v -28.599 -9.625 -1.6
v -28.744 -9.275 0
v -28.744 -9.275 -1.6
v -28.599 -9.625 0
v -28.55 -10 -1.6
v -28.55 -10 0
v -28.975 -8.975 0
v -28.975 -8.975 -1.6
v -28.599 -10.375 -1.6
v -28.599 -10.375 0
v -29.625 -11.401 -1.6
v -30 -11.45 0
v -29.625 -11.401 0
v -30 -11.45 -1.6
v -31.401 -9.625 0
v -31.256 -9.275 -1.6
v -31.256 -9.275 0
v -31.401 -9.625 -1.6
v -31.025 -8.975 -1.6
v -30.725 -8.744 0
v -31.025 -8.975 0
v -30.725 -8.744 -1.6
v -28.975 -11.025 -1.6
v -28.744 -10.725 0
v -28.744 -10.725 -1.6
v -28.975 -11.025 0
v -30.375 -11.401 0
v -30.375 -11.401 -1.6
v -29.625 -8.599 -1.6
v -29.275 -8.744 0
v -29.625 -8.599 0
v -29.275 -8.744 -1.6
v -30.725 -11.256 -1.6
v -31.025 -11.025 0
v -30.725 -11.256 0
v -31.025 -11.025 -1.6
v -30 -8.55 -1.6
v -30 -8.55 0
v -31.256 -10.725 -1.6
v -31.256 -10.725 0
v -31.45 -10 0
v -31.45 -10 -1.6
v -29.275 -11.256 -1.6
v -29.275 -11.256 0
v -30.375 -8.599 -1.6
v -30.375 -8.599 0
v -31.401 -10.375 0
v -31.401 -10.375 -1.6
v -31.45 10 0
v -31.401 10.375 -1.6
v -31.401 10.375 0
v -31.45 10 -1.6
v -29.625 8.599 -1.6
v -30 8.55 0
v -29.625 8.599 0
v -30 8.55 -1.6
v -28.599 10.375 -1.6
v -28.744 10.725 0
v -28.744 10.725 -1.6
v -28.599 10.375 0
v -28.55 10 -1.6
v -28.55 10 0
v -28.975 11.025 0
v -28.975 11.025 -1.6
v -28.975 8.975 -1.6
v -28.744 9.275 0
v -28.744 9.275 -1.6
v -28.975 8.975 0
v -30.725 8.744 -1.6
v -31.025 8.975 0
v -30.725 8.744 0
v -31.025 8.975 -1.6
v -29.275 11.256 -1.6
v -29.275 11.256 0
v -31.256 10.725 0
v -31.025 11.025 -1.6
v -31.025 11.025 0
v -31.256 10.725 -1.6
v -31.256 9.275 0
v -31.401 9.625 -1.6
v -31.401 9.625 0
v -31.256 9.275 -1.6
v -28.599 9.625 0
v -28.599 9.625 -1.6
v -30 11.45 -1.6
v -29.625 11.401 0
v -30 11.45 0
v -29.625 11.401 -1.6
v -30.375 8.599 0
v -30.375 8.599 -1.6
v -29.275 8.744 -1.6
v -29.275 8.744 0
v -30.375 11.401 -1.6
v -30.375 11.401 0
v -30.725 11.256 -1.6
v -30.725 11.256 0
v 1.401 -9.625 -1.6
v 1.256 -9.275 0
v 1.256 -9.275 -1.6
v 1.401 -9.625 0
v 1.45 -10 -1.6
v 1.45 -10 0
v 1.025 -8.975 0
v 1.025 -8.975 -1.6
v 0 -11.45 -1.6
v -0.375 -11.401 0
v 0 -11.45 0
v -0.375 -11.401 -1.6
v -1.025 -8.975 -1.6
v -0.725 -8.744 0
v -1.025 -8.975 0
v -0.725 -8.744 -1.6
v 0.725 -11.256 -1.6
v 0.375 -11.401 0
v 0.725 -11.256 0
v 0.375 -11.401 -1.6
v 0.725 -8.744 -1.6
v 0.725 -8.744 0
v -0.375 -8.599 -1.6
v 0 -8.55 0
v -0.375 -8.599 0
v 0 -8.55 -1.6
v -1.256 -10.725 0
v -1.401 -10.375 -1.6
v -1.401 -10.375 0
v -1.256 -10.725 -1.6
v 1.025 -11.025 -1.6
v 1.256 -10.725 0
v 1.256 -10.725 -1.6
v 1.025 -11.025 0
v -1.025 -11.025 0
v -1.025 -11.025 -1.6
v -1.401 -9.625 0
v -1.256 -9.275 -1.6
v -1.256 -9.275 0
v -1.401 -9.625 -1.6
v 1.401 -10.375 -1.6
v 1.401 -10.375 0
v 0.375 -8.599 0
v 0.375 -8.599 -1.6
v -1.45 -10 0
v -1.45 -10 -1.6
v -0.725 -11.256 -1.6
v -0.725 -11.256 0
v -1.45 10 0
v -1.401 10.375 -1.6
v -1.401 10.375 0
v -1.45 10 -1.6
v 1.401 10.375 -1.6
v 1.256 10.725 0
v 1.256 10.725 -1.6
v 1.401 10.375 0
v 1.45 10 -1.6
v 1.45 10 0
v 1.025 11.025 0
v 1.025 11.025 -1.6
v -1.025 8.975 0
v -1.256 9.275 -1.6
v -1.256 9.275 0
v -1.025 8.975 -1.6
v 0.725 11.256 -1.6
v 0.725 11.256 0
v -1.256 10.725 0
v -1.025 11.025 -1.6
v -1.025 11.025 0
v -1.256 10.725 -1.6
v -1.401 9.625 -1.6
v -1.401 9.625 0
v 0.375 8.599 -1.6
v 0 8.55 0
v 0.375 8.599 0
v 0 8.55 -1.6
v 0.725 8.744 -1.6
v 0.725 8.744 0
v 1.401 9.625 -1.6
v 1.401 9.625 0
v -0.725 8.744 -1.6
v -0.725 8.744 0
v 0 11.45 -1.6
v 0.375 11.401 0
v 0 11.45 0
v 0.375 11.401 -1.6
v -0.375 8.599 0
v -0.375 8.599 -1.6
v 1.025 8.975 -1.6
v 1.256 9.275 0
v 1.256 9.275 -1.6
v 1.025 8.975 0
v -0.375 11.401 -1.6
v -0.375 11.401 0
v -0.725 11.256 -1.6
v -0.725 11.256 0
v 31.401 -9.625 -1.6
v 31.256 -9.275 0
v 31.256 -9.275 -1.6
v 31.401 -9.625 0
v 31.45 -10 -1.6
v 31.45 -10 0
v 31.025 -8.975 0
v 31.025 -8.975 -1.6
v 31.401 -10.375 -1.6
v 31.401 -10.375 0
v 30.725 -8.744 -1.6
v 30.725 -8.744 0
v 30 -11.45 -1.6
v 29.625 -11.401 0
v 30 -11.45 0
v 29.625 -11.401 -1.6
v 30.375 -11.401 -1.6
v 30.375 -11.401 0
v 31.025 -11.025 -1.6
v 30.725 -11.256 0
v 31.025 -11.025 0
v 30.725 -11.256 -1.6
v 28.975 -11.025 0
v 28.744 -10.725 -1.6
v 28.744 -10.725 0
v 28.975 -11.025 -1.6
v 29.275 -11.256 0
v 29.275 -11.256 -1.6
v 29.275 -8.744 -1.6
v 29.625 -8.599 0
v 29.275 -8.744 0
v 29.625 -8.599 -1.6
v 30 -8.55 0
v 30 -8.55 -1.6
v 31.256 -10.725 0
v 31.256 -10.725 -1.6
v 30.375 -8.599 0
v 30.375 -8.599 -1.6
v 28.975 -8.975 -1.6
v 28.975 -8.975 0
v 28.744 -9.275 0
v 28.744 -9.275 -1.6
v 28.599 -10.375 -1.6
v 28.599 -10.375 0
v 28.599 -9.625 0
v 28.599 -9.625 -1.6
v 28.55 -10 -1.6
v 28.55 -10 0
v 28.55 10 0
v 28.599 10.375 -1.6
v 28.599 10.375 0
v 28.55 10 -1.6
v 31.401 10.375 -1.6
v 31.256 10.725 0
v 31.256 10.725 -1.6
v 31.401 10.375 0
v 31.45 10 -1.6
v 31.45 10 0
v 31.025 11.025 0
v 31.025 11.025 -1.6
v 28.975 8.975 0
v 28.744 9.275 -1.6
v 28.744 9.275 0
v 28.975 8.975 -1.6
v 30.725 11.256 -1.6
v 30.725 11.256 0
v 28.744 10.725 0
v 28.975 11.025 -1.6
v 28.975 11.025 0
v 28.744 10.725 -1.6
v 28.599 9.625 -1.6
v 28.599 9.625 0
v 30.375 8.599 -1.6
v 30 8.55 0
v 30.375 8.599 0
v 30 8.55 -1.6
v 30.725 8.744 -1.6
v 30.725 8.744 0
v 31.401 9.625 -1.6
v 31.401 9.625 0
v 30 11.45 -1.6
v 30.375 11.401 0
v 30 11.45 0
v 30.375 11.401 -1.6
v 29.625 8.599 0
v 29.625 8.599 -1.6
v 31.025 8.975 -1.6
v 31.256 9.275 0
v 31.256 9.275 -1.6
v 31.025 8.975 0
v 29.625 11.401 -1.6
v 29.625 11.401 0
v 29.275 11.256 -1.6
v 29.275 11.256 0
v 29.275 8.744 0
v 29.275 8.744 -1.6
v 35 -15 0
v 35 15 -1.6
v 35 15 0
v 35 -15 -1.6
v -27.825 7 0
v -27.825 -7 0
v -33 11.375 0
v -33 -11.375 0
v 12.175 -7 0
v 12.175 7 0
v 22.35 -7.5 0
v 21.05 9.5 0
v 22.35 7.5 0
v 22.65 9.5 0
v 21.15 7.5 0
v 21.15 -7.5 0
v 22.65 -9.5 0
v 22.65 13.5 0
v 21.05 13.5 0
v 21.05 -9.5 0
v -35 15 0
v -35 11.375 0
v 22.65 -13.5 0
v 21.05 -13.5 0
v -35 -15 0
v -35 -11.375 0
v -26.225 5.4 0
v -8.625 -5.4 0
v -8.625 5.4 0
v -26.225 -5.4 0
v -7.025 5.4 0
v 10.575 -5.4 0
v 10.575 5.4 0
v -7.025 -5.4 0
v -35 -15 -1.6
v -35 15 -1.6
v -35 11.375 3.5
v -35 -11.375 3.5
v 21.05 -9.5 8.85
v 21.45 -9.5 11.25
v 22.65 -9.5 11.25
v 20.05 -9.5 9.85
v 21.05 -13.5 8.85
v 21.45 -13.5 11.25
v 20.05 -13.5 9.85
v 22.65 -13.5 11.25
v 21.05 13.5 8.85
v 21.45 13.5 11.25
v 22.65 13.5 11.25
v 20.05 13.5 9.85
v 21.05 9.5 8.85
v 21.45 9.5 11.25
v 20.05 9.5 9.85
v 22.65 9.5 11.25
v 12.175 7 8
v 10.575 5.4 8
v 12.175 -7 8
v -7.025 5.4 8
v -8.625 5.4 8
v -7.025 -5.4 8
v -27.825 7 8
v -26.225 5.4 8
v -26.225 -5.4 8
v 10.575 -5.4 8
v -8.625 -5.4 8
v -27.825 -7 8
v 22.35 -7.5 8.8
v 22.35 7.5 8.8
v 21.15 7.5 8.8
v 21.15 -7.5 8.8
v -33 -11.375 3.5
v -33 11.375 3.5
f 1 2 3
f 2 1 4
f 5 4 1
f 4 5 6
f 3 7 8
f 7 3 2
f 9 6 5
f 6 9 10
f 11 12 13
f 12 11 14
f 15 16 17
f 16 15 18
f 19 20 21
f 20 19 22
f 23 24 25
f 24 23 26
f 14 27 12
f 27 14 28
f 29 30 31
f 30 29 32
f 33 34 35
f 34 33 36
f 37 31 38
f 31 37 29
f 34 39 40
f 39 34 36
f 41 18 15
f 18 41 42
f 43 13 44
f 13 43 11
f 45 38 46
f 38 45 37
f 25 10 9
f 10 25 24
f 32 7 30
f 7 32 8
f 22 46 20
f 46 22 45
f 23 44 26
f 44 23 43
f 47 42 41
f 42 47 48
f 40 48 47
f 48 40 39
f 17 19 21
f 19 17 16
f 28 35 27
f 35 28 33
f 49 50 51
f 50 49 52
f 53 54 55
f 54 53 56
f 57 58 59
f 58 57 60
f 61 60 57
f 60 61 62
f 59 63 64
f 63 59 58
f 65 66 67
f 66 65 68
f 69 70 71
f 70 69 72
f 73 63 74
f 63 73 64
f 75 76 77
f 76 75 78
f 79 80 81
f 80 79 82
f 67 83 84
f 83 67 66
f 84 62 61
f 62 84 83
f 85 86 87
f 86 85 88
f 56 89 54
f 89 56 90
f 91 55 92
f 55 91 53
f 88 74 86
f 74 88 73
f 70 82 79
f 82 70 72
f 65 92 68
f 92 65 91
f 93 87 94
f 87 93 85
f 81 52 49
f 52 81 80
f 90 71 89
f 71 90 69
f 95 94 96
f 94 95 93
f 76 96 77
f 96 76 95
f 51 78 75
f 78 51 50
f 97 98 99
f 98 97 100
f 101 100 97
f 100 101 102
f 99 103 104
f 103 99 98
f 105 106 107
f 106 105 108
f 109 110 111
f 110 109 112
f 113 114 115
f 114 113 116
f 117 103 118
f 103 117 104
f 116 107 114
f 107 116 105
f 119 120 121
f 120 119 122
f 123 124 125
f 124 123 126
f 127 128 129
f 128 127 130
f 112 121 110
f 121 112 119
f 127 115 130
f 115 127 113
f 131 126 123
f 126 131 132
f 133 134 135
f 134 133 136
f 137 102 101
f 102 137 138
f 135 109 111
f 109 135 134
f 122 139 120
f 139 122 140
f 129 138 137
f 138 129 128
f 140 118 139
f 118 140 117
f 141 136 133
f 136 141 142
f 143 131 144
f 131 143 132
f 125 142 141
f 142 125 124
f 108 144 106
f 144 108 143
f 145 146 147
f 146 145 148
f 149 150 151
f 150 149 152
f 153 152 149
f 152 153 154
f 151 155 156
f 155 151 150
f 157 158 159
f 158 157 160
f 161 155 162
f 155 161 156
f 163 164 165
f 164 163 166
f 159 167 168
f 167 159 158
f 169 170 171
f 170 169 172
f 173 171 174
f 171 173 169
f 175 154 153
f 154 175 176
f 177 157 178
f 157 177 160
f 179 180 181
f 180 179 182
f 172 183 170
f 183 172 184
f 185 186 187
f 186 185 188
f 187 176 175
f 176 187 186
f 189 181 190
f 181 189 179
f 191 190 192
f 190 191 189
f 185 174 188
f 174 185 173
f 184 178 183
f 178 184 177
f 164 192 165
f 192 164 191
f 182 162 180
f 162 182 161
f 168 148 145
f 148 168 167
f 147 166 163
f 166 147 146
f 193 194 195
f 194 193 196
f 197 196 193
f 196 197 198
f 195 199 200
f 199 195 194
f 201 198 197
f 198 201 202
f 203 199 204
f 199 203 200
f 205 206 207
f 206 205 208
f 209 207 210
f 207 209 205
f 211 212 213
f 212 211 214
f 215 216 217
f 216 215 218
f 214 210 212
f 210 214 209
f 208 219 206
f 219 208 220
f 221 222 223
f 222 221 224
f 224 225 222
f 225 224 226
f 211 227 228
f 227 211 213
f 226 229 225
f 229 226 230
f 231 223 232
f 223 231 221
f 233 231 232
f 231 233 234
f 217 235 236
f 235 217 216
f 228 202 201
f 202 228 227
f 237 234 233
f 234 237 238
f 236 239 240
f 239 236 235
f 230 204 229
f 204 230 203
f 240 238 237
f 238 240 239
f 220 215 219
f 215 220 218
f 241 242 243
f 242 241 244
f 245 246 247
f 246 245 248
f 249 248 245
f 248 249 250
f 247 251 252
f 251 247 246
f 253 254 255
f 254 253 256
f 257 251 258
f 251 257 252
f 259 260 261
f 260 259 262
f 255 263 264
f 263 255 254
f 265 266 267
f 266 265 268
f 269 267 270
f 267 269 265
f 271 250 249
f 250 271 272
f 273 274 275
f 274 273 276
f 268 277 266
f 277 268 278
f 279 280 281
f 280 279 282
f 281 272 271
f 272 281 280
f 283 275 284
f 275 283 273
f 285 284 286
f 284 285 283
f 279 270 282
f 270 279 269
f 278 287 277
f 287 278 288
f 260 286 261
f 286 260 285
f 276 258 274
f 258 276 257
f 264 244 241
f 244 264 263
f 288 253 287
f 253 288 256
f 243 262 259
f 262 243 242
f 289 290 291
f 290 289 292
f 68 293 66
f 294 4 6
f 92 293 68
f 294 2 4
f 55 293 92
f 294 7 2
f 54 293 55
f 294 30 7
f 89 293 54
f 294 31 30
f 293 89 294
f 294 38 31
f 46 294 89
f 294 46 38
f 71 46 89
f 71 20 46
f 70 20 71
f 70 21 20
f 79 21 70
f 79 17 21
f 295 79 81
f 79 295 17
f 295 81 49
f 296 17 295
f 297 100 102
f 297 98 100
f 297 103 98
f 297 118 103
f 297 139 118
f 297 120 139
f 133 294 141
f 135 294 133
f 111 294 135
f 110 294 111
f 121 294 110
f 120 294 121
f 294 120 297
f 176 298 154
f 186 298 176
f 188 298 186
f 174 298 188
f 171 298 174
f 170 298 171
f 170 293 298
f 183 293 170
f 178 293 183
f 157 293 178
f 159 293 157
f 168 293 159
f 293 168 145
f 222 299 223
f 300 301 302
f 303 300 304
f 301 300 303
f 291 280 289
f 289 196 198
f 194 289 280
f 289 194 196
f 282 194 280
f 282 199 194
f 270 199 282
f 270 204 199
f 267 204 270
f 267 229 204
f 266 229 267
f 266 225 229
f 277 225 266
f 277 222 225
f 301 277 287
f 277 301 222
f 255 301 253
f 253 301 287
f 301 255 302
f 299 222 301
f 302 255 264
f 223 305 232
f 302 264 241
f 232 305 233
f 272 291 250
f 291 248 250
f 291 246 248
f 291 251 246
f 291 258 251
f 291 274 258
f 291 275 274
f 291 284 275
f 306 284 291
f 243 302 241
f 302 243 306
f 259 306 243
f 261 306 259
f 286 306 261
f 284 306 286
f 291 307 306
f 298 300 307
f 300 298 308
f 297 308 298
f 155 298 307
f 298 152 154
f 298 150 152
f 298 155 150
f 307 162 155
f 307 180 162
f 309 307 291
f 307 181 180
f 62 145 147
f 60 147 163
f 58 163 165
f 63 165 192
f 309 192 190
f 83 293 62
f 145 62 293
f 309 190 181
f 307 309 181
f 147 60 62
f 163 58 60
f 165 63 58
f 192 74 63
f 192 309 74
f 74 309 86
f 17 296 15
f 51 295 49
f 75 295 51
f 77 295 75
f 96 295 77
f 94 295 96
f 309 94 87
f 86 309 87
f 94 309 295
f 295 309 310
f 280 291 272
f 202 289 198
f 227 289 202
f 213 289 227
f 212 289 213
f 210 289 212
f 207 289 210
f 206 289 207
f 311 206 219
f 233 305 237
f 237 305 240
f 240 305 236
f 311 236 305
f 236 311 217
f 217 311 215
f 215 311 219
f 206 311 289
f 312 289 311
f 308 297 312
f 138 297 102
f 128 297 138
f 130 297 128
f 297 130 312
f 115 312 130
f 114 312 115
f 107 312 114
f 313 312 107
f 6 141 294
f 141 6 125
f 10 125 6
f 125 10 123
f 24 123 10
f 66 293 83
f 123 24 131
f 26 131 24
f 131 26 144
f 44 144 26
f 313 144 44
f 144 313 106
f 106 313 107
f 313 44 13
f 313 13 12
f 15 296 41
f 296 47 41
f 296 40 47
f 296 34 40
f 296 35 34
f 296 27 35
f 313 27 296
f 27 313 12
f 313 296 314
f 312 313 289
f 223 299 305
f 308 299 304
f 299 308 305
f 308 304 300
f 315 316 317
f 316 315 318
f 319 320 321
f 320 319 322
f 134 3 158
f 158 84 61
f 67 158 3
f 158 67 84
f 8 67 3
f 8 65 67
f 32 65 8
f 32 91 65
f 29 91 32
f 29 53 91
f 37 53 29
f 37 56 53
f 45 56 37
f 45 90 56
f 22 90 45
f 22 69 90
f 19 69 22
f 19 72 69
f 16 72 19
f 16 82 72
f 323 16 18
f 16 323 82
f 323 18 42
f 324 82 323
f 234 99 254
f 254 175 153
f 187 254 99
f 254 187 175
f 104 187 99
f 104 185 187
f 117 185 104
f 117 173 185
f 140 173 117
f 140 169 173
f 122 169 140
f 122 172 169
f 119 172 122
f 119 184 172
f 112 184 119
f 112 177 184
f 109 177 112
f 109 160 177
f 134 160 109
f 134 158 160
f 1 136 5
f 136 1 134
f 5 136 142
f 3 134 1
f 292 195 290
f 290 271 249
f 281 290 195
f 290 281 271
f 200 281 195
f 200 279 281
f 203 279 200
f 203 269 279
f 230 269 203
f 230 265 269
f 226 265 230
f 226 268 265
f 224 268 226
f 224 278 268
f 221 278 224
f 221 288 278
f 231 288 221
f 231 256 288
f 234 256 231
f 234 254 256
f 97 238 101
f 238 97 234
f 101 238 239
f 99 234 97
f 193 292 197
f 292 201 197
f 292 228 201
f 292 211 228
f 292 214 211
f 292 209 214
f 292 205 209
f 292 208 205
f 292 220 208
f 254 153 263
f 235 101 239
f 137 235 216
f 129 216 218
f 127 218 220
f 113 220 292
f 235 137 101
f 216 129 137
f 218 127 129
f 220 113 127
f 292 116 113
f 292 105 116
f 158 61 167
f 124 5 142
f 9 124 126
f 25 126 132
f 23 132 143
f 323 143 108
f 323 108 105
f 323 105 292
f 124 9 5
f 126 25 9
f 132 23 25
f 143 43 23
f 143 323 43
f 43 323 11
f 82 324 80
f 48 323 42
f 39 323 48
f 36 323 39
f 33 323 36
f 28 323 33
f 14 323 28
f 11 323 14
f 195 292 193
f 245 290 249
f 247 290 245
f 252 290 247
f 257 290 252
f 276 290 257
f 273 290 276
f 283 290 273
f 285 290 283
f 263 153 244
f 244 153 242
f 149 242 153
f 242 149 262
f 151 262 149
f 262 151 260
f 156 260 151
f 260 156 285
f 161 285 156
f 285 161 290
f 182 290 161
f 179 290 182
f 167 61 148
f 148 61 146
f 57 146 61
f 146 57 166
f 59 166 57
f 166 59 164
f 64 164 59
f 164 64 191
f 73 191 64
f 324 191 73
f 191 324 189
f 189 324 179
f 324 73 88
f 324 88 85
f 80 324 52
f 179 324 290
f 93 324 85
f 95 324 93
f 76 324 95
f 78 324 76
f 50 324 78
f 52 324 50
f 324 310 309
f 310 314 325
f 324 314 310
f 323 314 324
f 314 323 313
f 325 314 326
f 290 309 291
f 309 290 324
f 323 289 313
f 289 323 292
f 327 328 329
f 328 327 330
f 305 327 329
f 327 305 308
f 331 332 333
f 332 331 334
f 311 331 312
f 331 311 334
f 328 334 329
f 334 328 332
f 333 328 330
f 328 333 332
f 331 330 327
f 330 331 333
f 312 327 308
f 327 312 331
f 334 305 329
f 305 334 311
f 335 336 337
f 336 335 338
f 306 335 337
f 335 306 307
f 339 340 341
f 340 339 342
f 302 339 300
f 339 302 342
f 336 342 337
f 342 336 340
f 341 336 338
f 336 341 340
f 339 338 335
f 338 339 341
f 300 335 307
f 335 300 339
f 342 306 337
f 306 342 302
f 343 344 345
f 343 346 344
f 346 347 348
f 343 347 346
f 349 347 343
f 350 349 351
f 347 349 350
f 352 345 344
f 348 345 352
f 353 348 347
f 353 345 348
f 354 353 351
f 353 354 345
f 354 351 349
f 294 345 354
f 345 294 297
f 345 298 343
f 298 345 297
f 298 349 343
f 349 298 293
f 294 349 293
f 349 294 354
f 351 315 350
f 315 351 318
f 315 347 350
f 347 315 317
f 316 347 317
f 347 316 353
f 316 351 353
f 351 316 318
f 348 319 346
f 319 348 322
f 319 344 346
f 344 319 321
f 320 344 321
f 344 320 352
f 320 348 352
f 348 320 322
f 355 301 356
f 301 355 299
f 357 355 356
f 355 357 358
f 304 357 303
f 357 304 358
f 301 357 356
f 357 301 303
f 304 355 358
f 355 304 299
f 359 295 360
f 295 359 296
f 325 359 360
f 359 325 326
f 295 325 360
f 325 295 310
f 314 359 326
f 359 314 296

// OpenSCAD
// file: ../../screw-post/screw-post.scad
//-----------------------------------------------------------------------
// Screw post: a round post off the floor that a board screws down onto
//
// Two ways to fix:
//   "nut"  clearance hole through the post and floor; the nut sits in a hex
//          trap in the floor's underside, so the screw goes in from the top
//   "tap"  a pilot hole the screw cuts its own thread in (one or two fittings
//          in PLA/PETG); blind, the floor stays whole underneath
// and "head" for a screw up from below (head in a counterbore, nut on top).
//
// Modules, all in the same frame:
//   screwPostGhost()     the screw (and nut), for previews
//   screwPost()          the post: add to the floor
//   screwPostFloorCut()  subtract from the floor: nut trap / counterbore and hole
//
// Frame: origin on the floor top, on the post's axis. Z up; the floor is
// Z = -floorThick .. 0. Units: mm.
//
// Sizes: "M2", "M2.5", "M3". screwPostScrew(size, ...) says which screw length
// reaches, so a project can assert it has that screw in the kit.
//-----------------------------------------------------------------------

//-- [name, screw Ø, nut across flats, nut thick, head Ø, head height, tap hole, post Ø]
//-- Nuts ISO 4032; heads ISO 7380 button. Tap holes: the usual ~0.8 x Ø for plastic
screwSizes = [
  ["M2",   2.0, 4.0, 1.6, 3.5, 1.1, 1.6, 5.0],
  ["M2.5", 2.5, 5.0, 2.0, 4.4, 1.4, 2.1, 6.0],    // head 4.4: measured on the kit's M2.5 (controller base)
  ["M3",   3.0, 5.5, 2.4, 5.7, 1.65, 2.5, 7.0],
];

screwHoleClear = 0.4;     // added to the screw Ø for a clearance hole
screwNutClear  = 0.3;     // CAL: across flats, nut trap over the nut. Set by the fit piece
screwTapClear  = 0.0;     // CAL: added to the tap hole. Set by the fit piece
screwHeadClear = 0.6;     // counterbore over the head Ø

function screwSize(size) = let (i = search([size], screwSizes)[0])
  assert(i != [] && i != undef, str("unknown screw size ", size)) screwSizes[i];
function screwDia(size)    = screwSize(size)[1];
function screwNutAF(size)  = screwSize(size)[2];
function screwNutH(size)   = screwSize(size)[3];
function screwHeadDia(size)= screwSize(size)[4];
function screwHeadH(size)  = screwSize(size)[5];
function screwPostDia(size)= screwSize(size)[7];

//-- Shortest screw that fills the nut, from the top of the clamped part (h + clamp
//-- above the floor) down to the nut trap's underside. Round up to a length you have.
function screwPostScrew(size, h, floorThick, clamp = 1.6) = h + clamp + floorThick;

module screwPostGhost(size, h, floorThick, clamp = 1.6, length, how = "nut")
{
  d = screwDia(size);
  L = is_undef(length) ? screwPostScrew(size, h, floorThick, clamp) : length;
  top = h + clamp;
  if (how == "head")
  {
    %color("Silver") translate([0, 0, -floorThick]) cylinder(d = screwHeadDia(size), h = screwHeadH(size), $fn = 24);
    %color("Silver") translate([0, 0, -floorThick + screwHeadH(size)]) cylinder(d = d, h = L, $fn = 16);
  }
  else
  {
    %color("Silver") translate([0, 0, top]) cylinder(d = screwHeadDia(size), h = screwHeadH(size), $fn = 24);
    %color("Silver") translate([0, 0, top - L]) cylinder(d = d, h = L, $fn = 16);
    if (how == "nut")
      %color("DimGray") translate([0, 0, -floorThick]) rotate([0, 0, 30]) cylinder(d = screwNutAF(size)/cos(30), h = screwNutH(size), $fn = 6);
  }
}

//-- how: "nut" | "head" (through hole) or "tap" (blind pilot hole). postDia defaults by size
module screwPost(size, h, how = "nut", postDia, tapClear = screwTapClear)
{
  pd = is_undef(postDia) ? screwPostDia(size) : postDia;
  hole = how == "tap" ? screwSize(size)[6] + tapClear : screwDia(size) + screwHoleClear;
  difference()
  {
    translate([0, 0, -0.01]) cylinder(d = pd, h = h + 0.01, $fn = 40);
    translate([0, 0, how == "tap" ? 0.6 : -1]) cylinder(d = hole, h = h + 2, $fn = 24);
    //-- lead-in so the screw starts square
    translate([0, 0, h - 0.4]) cylinder(d1 = hole, d2 = hole + 0.8, h = 0.41, $fn = 24);
  }
}

//-- "nut": hex trap from the underside, opening a little over the nut so it sits flush.
//-- "head": counterbore for the head. "tap": nothing.
module screwPostFloorCut(size, floorThick, how = "nut", nutClear = screwNutClear)
{
  d = screwDia(size) + screwHoleClear;
  if (how == "nut")
  {
    af = screwNutAF(size) + nutClear;
    translate([0, 0, -floorThick - 1]) rotate([0, 0, 30]) cylinder(d = af/cos(30), h = screwNutH(size) + 0.1 + 1, $fn = 6);
    translate([0, 0, -floorThick - 1]) cylinder(d = d + 0.4, h = floorThick + 2, $fn = 24);
  }
  if (how == "head")
  {
    translate([0, 0, -floorThick - 1]) cylinder(d = screwHeadDia(size) + screwHeadClear, h = screwHeadH(size) + 0.2 + 1, $fn = 32);
    translate([0, 0, -floorThick - 1]) cylinder(d = d + 0.4, h = floorThick + 2, $fn = 24);
  }
  assert(how == "tap" || floorThick >= (how == "nut" ? screwNutH(size) : screwHeadH(size)) + 0.1 + 0.3,
         str("floor too thin for the ", size, " ", how));
}
// file: ../../usb-c-port/usb-c-port.scad
//-----------------------------------------------------------------------
// USB-C port through a wall, flush: the socket's metal shell sits in a
// close-fitting pocket in the wall, walled in on all four sides, its face
// level with the outside. The cable seats the way it does on a laptop.
//
// A board's socket only overhangs the board edge by a mm or so, less than
// the wall. So the board's end tucks into a shallow relief in the wall's
// inner face, the width of the board, leaving the wall round the socket
// thin enough for the face to reach the outside. When that would leave less
// than usbcMinWall (a socket that barely overhangs), the face sits back from
// the outside instead: usbcRecess() says how far.
//
// Modules, all in the same frame:
//   usbcGhost()     the socket and the board's end, for previews
//   usbcWallCut()   subtract from the wall: socket pocket and board relief
//
// Frame: origin on the floor top at the wall's inner face, under the socket's
// axis. +X into the box, Z up. The wall is X = -wall .. 0. The board is
// component side up, socket on top (top-mount, as on the FireBeetle, C3 Super
// Mini and S3 DevKitC). Units: mm.
//
// usbcBoardEdgeX() gives where the board's edge lands (negative: inside the
// wall), so a holder can put its posts or pocket to match.
//-----------------------------------------------------------------------

//-- The socket: USB-C receptacle shell (USB-IF 8.34 x 2.56 plug, receptacle shell ~8.94 x 3.26)
usbcShellW     = 8.94;
usbcShellH     = 3.26;    // CAL per board: measured 3.2 on the FireBeetle
usbcShellR     = 1.2;     // CAL: end radius. Full round would be 1.63; most shells are squarer
usbcShellDepth = 7.35;    // face to back

//-- The pocket
usbcClearance  = 0.15;    // CAL: per side, shell to pocket. Set by the fit piece
usbcMinWall    = 1.0;     // thinnest wall left round the socket
usbcReliefGap  = 0.3;     // board relief over the board, each side and above/below
usbcChamfer    = 0.3;     // lead-in on the outside edge

//-- How far the socket face sits back from the outside: 0 (flush) unless the socket
//-- overhangs the board edge by less than usbcMinWall
function usbcRecess(overhang, minWall = usbcMinWall) = max(0, minWall - overhang);
//-- X of the board's socket edge in this frame
function usbcBoardEdgeX(wall, overhang, recess) =
  -wall + (is_undef(recess) ? usbcRecess(overhang) : recess) + overhang;
//-- Z of the board's underside above the floor top
function usbcBoardZ(axisZ, pcb, shellH = usbcShellH) = axisZ - shellH/2 - pcb;

module usbcShell2D(grow = 0, w = usbcShellW, h = usbcShellH, r = usbcShellR)
{
  offset(r = r + grow, $fn = 24) square([w - 2*r, h - 2*r], center = true);
}

//-- axisZ: socket axis above the floor. boardW/pcb: the board, for the ghost and relief.
//-- shift: socket centre across the board's width from the board's centre line (+Y)
module usbcGhost(axisZ, wall, overhang, boardW, pcb = 1.6, recess, shift = 0, shellH = usbcShellH, shellW = usbcShellW)
{
  ex = usbcBoardEdgeX(wall, overhang, recess);
  %color("Silver") translate([ex - overhang, 0, axisZ]) rotate([0, 90, 0]) rotate([0, 0, 90])
    linear_extrude(usbcShellDepth) usbcShell2D(w = shellW, h = shellH);
  %color("DarkSlateGray") translate([ex, -boardW/2 - shift, usbcBoardZ(axisZ, pcb, shellH)]) cube([12, boardW, pcb]);
}

module usbcWallCut(axisZ, wall, overhang, boardW, pcb = 1.6, recess, shift = 0,
                   clearance = usbcClearance, shellH = usbcShellH, shellW = usbcShellW, aboveBoard)
{
  rc = is_undef(recess) ? usbcRecess(overhang) : recess;
  ex = usbcBoardEdgeX(wall, overhang, rc);
  bz = usbcBoardZ(axisZ, pcb, shellH);
  //-- what stands on the board near its edge: the socket, unless told taller
  up = is_undef(aboveBoard) ? shellH : aboveBoard;
  assert(ex - overhang + wall >= -0.01, "socket face would stand proud of the wall");
  assert(rc > 0 || overhang >= usbcMinWall - 0.01, "wall round the socket under usbcMinWall");
  //-- socket pocket, through the wall
  translate([-wall - 1, 0, axisZ]) rotate([0, 90, 0]) rotate([0, 0, 90])
    linear_extrude(wall + 2) usbcShell2D(clearance, w = shellW, h = shellH);
  //-- lead-in chamfer on the outside
  translate([-wall, 0, axisZ]) rotate([0, 90, 0]) rotate([0, 0, 90])
    hull()
    {
      translate([0, 0, -0.01]) linear_extrude(0.01) usbcShell2D(clearance + usbcChamfer, w = shellW, h = shellH);
      translate([0, 0, usbcChamfer]) linear_extrude(0.01) usbcShell2D(clearance, w = shellW, h = shellH);
    }
  //-- board relief in the inner face, when the board's edge lands inside the wall
  if (ex < 0)
    translate([ex - usbcReliefGap, -boardW/2 - shift - usbcReliefGap, bz - usbcReliefGap])
      cube([-ex + usbcReliefGap + 1, boardW + 2*usbcReliefGap, pcb + up + 2*usbcReliefGap]);
}
// file: ../../board-pocket/board-pocket.scad
//-----------------------------------------------------------------------
// Board pocket: holds a board that has no mounting holes
//
// The board sits on a central pedestal with a pad of double-sided foam tape
// on top, inside a low wall that follows its outline. The pedestal keeps
// the board's edges off the floor, so lead stubs soldered through the edge
// holes have room underneath; gaps in the wall let the leads out. The wall
// only locates the board: the tape holds it down, and in a closed box a lid
// pad presses a pad of foam onto it (boardLidPad below).
//
// Modules, all in the same frame:
//   boardPocketGhost()   the board and its tape, for previews
//   boardPocketHolder()  the plastic: pedestal and outline wall, add to the floor
//   boardLidPad()        a block hanging from the lid that presses foam onto the board
//   boardLidPadGhost()   the foam under it, squashed, for previews
//
// Frame: origin on the floor top, under the centre of the board's outline.
// X along the board's length l, Y across its width w, Z up. Units: mm.
//
// Sides are listed [-X, +X, -Y, +Y], each one of
//   "gap"    wall with a gap in the middle for leads (gapW wide)
//   "solid"  whole wall: use it where the board takes a push (a plug)
//   "open"   no wall: the board's edge goes into a box wall (a USB port)
//
// Used by esp32-c3-supermini, esp32-s3-devkitc and rs485-max485.
//-----------------------------------------------------------------------

//-- From the controller project's receiver.scad / rack-end.scad (boardPocket), 2026-10-30
bpPedestal  = 2.5;     // floor to the tape: room for lead stubs under the board edges
bpTape      = 1.0;     // double-sided foam tape on the pedestal. CAL: how far it squashes
bpWall      = 1.2;     // outline wall thickness
bpRise      = 1.0;     // wall top above the PCB underside (the controller project's rack-end: 0.8 under the S3's module)
bpClearance = 0.4;     // per side, board outline to wall: PETG. 0.3 for PLA. Set by the fit piece
bpGapW      = 6;       // lead gap in a "gap" side
bpPadInset  = 4;       // default pedestal: the board less this all round

//-- Lid hold-down (the controller project's receiver / rack-end lid pads)
bpFoam      = 3.0;     // CAL: self-adhesive foam stuck under each lid pad
bpSqueeze   = 1.0;     // how far the lid squashes it: ~1/3 for soft foam, 0.3 for felt

//-- PCB underside above the floor top
function boardPocketZ(pedestal = bpPedestal, tape = bpTape) = pedestal + tape;
//-- default pedestal [l, w] for a board
function boardPocketPad(l, w, inset = bpPadInset) = [max(l - 2*inset, 4), max(w - 2*inset, 4)];
//-- Z of a lid pad's underside, pressing on a surface at surfaceZ (board top, or a part on it)
function boardLidPadZ(surfaceZ, foam = bpFoam, squeeze = bpSqueeze) =
  assert(squeeze > 0 && squeeze < foam, "foam would not touch the board")
  surfaceZ + foam - squeeze;

function bpSides4(s) = is_list(s) ? s : [s, s, s, s];

module boardPocketGhost(l, w, pcb = 1.6, pad, pedestal = bpPedestal, tape = bpTape)
{
  p = is_undef(pad) ? boardPocketPad(l, w) : pad;
  %color("White") translate([-p[0]/2, -p[1]/2, pedestal]) cube([p[0], p[1], tape]);
  %color("DarkGreen") translate([-l/2, -w/2, pedestal + tape]) cube([l, w, pcb]);
}

//-- pad: pedestal [l, w]; gapW a number or one per side
module boardPocketHolder(l, w, pad, sides = "gap", gapW = bpGapW, clearance = bpClearance,
                         pedestal = bpPedestal, tape = bpTape, wall = bpWall, rise = bpRise)
{
  p   = is_undef(pad) ? boardPocketPad(l, w) : pad;
  s   = bpSides4(sides);
  g   = bpSides4(gapW);
  ix  = l/2 + clearance;                 // inner half sizes
  iy  = w/2 + clearance;
  top = pedestal + tape + rise;
  assert(p[0] <= l && p[1] <= w, "pedestal bigger than the board");
  for (k = s) assert(k == "gap" || k == "solid" || k == "open", str("unknown side ", k));

  //-- pedestal, centred under the board
  translate([-p[0]/2, -p[1]/2, -0.01]) cube([p[0], p[1], pedestal + 0.01]);
  //-- outline wall
  difference()
  {
    translate([-ix - wall, -iy - wall, -0.01]) cube([2*(ix + wall), 2*(iy + wall), top + 0.01]);
    translate([-ix, -iy, -1]) cube([2*ix, 2*iy, top + 2]);
    for (i = [0 : 3])
    {
      //-- each side's cut, drawn for -X then turned into place
      ax = (i < 2) ? ix : iy;         // inner half size across the side
      al = (i < 2) ? iy : ix;         // half length along it
      rotate([0, 0, [0, 180, 90, 270][i]])   // -X, +X, -Y, +Y
      {
        if (s[i] == "gap")
          translate([-ax - wall - 1, -g[i]/2, -1]) cube([wall + 2, g[i], top + 2]);
        if (s[i] == "open")
          translate([-ax - wall - 1, -al - wall - 1, -1]) cube([wall + 1.01, 2*(al + wall + 1), top + 2]);
      }
    }
  }
}

//-- A lid pad over the rectangle size [x, y] centred at `at`, from the squashed foam up to
//-- lidZ (the lid's inner face in this frame), running `into` up into the lid plate
module boardLidPad(size, at = [0, 0], surfaceZ, lidZ, foam = bpFoam, squeeze = bpSqueeze, into = 0.5)
{
  z0 = boardLidPadZ(surfaceZ, foam, squeeze);
  assert(lidZ > z0, "lid is below the pad: the box is too low for the foam");
  translate([at[0] - size[0]/2, at[1] - size[1]/2, z0]) cube([size[0], size[1], lidZ - z0 + into]);
}

module boardLidPadGhost(size, at = [0, 0], surfaceZ, foam = bpFoam, squeeze = bpSqueeze)
{
  %color("Gray") translate([at[0] - size[0]/2, at[1] - size[1]/2, surfaceZ]) cube([size[0], size[1], foam - squeeze]);
}
// main file
// The S3 on its carrier, for the catalogue: a 7 x 3 plate (solid), the pedestal frame between
// the pin rows, the back stop under the module's overhang, a snap hook either side of it over the
// board's back edge, and the wall lip across the USB end. YD clone, right-hand port, made for a
// 2.4 wall. The plastic only: the Ghost is % so it never renders.
use <../esp32-s3-devkitc.scad>

s3Carrier();
